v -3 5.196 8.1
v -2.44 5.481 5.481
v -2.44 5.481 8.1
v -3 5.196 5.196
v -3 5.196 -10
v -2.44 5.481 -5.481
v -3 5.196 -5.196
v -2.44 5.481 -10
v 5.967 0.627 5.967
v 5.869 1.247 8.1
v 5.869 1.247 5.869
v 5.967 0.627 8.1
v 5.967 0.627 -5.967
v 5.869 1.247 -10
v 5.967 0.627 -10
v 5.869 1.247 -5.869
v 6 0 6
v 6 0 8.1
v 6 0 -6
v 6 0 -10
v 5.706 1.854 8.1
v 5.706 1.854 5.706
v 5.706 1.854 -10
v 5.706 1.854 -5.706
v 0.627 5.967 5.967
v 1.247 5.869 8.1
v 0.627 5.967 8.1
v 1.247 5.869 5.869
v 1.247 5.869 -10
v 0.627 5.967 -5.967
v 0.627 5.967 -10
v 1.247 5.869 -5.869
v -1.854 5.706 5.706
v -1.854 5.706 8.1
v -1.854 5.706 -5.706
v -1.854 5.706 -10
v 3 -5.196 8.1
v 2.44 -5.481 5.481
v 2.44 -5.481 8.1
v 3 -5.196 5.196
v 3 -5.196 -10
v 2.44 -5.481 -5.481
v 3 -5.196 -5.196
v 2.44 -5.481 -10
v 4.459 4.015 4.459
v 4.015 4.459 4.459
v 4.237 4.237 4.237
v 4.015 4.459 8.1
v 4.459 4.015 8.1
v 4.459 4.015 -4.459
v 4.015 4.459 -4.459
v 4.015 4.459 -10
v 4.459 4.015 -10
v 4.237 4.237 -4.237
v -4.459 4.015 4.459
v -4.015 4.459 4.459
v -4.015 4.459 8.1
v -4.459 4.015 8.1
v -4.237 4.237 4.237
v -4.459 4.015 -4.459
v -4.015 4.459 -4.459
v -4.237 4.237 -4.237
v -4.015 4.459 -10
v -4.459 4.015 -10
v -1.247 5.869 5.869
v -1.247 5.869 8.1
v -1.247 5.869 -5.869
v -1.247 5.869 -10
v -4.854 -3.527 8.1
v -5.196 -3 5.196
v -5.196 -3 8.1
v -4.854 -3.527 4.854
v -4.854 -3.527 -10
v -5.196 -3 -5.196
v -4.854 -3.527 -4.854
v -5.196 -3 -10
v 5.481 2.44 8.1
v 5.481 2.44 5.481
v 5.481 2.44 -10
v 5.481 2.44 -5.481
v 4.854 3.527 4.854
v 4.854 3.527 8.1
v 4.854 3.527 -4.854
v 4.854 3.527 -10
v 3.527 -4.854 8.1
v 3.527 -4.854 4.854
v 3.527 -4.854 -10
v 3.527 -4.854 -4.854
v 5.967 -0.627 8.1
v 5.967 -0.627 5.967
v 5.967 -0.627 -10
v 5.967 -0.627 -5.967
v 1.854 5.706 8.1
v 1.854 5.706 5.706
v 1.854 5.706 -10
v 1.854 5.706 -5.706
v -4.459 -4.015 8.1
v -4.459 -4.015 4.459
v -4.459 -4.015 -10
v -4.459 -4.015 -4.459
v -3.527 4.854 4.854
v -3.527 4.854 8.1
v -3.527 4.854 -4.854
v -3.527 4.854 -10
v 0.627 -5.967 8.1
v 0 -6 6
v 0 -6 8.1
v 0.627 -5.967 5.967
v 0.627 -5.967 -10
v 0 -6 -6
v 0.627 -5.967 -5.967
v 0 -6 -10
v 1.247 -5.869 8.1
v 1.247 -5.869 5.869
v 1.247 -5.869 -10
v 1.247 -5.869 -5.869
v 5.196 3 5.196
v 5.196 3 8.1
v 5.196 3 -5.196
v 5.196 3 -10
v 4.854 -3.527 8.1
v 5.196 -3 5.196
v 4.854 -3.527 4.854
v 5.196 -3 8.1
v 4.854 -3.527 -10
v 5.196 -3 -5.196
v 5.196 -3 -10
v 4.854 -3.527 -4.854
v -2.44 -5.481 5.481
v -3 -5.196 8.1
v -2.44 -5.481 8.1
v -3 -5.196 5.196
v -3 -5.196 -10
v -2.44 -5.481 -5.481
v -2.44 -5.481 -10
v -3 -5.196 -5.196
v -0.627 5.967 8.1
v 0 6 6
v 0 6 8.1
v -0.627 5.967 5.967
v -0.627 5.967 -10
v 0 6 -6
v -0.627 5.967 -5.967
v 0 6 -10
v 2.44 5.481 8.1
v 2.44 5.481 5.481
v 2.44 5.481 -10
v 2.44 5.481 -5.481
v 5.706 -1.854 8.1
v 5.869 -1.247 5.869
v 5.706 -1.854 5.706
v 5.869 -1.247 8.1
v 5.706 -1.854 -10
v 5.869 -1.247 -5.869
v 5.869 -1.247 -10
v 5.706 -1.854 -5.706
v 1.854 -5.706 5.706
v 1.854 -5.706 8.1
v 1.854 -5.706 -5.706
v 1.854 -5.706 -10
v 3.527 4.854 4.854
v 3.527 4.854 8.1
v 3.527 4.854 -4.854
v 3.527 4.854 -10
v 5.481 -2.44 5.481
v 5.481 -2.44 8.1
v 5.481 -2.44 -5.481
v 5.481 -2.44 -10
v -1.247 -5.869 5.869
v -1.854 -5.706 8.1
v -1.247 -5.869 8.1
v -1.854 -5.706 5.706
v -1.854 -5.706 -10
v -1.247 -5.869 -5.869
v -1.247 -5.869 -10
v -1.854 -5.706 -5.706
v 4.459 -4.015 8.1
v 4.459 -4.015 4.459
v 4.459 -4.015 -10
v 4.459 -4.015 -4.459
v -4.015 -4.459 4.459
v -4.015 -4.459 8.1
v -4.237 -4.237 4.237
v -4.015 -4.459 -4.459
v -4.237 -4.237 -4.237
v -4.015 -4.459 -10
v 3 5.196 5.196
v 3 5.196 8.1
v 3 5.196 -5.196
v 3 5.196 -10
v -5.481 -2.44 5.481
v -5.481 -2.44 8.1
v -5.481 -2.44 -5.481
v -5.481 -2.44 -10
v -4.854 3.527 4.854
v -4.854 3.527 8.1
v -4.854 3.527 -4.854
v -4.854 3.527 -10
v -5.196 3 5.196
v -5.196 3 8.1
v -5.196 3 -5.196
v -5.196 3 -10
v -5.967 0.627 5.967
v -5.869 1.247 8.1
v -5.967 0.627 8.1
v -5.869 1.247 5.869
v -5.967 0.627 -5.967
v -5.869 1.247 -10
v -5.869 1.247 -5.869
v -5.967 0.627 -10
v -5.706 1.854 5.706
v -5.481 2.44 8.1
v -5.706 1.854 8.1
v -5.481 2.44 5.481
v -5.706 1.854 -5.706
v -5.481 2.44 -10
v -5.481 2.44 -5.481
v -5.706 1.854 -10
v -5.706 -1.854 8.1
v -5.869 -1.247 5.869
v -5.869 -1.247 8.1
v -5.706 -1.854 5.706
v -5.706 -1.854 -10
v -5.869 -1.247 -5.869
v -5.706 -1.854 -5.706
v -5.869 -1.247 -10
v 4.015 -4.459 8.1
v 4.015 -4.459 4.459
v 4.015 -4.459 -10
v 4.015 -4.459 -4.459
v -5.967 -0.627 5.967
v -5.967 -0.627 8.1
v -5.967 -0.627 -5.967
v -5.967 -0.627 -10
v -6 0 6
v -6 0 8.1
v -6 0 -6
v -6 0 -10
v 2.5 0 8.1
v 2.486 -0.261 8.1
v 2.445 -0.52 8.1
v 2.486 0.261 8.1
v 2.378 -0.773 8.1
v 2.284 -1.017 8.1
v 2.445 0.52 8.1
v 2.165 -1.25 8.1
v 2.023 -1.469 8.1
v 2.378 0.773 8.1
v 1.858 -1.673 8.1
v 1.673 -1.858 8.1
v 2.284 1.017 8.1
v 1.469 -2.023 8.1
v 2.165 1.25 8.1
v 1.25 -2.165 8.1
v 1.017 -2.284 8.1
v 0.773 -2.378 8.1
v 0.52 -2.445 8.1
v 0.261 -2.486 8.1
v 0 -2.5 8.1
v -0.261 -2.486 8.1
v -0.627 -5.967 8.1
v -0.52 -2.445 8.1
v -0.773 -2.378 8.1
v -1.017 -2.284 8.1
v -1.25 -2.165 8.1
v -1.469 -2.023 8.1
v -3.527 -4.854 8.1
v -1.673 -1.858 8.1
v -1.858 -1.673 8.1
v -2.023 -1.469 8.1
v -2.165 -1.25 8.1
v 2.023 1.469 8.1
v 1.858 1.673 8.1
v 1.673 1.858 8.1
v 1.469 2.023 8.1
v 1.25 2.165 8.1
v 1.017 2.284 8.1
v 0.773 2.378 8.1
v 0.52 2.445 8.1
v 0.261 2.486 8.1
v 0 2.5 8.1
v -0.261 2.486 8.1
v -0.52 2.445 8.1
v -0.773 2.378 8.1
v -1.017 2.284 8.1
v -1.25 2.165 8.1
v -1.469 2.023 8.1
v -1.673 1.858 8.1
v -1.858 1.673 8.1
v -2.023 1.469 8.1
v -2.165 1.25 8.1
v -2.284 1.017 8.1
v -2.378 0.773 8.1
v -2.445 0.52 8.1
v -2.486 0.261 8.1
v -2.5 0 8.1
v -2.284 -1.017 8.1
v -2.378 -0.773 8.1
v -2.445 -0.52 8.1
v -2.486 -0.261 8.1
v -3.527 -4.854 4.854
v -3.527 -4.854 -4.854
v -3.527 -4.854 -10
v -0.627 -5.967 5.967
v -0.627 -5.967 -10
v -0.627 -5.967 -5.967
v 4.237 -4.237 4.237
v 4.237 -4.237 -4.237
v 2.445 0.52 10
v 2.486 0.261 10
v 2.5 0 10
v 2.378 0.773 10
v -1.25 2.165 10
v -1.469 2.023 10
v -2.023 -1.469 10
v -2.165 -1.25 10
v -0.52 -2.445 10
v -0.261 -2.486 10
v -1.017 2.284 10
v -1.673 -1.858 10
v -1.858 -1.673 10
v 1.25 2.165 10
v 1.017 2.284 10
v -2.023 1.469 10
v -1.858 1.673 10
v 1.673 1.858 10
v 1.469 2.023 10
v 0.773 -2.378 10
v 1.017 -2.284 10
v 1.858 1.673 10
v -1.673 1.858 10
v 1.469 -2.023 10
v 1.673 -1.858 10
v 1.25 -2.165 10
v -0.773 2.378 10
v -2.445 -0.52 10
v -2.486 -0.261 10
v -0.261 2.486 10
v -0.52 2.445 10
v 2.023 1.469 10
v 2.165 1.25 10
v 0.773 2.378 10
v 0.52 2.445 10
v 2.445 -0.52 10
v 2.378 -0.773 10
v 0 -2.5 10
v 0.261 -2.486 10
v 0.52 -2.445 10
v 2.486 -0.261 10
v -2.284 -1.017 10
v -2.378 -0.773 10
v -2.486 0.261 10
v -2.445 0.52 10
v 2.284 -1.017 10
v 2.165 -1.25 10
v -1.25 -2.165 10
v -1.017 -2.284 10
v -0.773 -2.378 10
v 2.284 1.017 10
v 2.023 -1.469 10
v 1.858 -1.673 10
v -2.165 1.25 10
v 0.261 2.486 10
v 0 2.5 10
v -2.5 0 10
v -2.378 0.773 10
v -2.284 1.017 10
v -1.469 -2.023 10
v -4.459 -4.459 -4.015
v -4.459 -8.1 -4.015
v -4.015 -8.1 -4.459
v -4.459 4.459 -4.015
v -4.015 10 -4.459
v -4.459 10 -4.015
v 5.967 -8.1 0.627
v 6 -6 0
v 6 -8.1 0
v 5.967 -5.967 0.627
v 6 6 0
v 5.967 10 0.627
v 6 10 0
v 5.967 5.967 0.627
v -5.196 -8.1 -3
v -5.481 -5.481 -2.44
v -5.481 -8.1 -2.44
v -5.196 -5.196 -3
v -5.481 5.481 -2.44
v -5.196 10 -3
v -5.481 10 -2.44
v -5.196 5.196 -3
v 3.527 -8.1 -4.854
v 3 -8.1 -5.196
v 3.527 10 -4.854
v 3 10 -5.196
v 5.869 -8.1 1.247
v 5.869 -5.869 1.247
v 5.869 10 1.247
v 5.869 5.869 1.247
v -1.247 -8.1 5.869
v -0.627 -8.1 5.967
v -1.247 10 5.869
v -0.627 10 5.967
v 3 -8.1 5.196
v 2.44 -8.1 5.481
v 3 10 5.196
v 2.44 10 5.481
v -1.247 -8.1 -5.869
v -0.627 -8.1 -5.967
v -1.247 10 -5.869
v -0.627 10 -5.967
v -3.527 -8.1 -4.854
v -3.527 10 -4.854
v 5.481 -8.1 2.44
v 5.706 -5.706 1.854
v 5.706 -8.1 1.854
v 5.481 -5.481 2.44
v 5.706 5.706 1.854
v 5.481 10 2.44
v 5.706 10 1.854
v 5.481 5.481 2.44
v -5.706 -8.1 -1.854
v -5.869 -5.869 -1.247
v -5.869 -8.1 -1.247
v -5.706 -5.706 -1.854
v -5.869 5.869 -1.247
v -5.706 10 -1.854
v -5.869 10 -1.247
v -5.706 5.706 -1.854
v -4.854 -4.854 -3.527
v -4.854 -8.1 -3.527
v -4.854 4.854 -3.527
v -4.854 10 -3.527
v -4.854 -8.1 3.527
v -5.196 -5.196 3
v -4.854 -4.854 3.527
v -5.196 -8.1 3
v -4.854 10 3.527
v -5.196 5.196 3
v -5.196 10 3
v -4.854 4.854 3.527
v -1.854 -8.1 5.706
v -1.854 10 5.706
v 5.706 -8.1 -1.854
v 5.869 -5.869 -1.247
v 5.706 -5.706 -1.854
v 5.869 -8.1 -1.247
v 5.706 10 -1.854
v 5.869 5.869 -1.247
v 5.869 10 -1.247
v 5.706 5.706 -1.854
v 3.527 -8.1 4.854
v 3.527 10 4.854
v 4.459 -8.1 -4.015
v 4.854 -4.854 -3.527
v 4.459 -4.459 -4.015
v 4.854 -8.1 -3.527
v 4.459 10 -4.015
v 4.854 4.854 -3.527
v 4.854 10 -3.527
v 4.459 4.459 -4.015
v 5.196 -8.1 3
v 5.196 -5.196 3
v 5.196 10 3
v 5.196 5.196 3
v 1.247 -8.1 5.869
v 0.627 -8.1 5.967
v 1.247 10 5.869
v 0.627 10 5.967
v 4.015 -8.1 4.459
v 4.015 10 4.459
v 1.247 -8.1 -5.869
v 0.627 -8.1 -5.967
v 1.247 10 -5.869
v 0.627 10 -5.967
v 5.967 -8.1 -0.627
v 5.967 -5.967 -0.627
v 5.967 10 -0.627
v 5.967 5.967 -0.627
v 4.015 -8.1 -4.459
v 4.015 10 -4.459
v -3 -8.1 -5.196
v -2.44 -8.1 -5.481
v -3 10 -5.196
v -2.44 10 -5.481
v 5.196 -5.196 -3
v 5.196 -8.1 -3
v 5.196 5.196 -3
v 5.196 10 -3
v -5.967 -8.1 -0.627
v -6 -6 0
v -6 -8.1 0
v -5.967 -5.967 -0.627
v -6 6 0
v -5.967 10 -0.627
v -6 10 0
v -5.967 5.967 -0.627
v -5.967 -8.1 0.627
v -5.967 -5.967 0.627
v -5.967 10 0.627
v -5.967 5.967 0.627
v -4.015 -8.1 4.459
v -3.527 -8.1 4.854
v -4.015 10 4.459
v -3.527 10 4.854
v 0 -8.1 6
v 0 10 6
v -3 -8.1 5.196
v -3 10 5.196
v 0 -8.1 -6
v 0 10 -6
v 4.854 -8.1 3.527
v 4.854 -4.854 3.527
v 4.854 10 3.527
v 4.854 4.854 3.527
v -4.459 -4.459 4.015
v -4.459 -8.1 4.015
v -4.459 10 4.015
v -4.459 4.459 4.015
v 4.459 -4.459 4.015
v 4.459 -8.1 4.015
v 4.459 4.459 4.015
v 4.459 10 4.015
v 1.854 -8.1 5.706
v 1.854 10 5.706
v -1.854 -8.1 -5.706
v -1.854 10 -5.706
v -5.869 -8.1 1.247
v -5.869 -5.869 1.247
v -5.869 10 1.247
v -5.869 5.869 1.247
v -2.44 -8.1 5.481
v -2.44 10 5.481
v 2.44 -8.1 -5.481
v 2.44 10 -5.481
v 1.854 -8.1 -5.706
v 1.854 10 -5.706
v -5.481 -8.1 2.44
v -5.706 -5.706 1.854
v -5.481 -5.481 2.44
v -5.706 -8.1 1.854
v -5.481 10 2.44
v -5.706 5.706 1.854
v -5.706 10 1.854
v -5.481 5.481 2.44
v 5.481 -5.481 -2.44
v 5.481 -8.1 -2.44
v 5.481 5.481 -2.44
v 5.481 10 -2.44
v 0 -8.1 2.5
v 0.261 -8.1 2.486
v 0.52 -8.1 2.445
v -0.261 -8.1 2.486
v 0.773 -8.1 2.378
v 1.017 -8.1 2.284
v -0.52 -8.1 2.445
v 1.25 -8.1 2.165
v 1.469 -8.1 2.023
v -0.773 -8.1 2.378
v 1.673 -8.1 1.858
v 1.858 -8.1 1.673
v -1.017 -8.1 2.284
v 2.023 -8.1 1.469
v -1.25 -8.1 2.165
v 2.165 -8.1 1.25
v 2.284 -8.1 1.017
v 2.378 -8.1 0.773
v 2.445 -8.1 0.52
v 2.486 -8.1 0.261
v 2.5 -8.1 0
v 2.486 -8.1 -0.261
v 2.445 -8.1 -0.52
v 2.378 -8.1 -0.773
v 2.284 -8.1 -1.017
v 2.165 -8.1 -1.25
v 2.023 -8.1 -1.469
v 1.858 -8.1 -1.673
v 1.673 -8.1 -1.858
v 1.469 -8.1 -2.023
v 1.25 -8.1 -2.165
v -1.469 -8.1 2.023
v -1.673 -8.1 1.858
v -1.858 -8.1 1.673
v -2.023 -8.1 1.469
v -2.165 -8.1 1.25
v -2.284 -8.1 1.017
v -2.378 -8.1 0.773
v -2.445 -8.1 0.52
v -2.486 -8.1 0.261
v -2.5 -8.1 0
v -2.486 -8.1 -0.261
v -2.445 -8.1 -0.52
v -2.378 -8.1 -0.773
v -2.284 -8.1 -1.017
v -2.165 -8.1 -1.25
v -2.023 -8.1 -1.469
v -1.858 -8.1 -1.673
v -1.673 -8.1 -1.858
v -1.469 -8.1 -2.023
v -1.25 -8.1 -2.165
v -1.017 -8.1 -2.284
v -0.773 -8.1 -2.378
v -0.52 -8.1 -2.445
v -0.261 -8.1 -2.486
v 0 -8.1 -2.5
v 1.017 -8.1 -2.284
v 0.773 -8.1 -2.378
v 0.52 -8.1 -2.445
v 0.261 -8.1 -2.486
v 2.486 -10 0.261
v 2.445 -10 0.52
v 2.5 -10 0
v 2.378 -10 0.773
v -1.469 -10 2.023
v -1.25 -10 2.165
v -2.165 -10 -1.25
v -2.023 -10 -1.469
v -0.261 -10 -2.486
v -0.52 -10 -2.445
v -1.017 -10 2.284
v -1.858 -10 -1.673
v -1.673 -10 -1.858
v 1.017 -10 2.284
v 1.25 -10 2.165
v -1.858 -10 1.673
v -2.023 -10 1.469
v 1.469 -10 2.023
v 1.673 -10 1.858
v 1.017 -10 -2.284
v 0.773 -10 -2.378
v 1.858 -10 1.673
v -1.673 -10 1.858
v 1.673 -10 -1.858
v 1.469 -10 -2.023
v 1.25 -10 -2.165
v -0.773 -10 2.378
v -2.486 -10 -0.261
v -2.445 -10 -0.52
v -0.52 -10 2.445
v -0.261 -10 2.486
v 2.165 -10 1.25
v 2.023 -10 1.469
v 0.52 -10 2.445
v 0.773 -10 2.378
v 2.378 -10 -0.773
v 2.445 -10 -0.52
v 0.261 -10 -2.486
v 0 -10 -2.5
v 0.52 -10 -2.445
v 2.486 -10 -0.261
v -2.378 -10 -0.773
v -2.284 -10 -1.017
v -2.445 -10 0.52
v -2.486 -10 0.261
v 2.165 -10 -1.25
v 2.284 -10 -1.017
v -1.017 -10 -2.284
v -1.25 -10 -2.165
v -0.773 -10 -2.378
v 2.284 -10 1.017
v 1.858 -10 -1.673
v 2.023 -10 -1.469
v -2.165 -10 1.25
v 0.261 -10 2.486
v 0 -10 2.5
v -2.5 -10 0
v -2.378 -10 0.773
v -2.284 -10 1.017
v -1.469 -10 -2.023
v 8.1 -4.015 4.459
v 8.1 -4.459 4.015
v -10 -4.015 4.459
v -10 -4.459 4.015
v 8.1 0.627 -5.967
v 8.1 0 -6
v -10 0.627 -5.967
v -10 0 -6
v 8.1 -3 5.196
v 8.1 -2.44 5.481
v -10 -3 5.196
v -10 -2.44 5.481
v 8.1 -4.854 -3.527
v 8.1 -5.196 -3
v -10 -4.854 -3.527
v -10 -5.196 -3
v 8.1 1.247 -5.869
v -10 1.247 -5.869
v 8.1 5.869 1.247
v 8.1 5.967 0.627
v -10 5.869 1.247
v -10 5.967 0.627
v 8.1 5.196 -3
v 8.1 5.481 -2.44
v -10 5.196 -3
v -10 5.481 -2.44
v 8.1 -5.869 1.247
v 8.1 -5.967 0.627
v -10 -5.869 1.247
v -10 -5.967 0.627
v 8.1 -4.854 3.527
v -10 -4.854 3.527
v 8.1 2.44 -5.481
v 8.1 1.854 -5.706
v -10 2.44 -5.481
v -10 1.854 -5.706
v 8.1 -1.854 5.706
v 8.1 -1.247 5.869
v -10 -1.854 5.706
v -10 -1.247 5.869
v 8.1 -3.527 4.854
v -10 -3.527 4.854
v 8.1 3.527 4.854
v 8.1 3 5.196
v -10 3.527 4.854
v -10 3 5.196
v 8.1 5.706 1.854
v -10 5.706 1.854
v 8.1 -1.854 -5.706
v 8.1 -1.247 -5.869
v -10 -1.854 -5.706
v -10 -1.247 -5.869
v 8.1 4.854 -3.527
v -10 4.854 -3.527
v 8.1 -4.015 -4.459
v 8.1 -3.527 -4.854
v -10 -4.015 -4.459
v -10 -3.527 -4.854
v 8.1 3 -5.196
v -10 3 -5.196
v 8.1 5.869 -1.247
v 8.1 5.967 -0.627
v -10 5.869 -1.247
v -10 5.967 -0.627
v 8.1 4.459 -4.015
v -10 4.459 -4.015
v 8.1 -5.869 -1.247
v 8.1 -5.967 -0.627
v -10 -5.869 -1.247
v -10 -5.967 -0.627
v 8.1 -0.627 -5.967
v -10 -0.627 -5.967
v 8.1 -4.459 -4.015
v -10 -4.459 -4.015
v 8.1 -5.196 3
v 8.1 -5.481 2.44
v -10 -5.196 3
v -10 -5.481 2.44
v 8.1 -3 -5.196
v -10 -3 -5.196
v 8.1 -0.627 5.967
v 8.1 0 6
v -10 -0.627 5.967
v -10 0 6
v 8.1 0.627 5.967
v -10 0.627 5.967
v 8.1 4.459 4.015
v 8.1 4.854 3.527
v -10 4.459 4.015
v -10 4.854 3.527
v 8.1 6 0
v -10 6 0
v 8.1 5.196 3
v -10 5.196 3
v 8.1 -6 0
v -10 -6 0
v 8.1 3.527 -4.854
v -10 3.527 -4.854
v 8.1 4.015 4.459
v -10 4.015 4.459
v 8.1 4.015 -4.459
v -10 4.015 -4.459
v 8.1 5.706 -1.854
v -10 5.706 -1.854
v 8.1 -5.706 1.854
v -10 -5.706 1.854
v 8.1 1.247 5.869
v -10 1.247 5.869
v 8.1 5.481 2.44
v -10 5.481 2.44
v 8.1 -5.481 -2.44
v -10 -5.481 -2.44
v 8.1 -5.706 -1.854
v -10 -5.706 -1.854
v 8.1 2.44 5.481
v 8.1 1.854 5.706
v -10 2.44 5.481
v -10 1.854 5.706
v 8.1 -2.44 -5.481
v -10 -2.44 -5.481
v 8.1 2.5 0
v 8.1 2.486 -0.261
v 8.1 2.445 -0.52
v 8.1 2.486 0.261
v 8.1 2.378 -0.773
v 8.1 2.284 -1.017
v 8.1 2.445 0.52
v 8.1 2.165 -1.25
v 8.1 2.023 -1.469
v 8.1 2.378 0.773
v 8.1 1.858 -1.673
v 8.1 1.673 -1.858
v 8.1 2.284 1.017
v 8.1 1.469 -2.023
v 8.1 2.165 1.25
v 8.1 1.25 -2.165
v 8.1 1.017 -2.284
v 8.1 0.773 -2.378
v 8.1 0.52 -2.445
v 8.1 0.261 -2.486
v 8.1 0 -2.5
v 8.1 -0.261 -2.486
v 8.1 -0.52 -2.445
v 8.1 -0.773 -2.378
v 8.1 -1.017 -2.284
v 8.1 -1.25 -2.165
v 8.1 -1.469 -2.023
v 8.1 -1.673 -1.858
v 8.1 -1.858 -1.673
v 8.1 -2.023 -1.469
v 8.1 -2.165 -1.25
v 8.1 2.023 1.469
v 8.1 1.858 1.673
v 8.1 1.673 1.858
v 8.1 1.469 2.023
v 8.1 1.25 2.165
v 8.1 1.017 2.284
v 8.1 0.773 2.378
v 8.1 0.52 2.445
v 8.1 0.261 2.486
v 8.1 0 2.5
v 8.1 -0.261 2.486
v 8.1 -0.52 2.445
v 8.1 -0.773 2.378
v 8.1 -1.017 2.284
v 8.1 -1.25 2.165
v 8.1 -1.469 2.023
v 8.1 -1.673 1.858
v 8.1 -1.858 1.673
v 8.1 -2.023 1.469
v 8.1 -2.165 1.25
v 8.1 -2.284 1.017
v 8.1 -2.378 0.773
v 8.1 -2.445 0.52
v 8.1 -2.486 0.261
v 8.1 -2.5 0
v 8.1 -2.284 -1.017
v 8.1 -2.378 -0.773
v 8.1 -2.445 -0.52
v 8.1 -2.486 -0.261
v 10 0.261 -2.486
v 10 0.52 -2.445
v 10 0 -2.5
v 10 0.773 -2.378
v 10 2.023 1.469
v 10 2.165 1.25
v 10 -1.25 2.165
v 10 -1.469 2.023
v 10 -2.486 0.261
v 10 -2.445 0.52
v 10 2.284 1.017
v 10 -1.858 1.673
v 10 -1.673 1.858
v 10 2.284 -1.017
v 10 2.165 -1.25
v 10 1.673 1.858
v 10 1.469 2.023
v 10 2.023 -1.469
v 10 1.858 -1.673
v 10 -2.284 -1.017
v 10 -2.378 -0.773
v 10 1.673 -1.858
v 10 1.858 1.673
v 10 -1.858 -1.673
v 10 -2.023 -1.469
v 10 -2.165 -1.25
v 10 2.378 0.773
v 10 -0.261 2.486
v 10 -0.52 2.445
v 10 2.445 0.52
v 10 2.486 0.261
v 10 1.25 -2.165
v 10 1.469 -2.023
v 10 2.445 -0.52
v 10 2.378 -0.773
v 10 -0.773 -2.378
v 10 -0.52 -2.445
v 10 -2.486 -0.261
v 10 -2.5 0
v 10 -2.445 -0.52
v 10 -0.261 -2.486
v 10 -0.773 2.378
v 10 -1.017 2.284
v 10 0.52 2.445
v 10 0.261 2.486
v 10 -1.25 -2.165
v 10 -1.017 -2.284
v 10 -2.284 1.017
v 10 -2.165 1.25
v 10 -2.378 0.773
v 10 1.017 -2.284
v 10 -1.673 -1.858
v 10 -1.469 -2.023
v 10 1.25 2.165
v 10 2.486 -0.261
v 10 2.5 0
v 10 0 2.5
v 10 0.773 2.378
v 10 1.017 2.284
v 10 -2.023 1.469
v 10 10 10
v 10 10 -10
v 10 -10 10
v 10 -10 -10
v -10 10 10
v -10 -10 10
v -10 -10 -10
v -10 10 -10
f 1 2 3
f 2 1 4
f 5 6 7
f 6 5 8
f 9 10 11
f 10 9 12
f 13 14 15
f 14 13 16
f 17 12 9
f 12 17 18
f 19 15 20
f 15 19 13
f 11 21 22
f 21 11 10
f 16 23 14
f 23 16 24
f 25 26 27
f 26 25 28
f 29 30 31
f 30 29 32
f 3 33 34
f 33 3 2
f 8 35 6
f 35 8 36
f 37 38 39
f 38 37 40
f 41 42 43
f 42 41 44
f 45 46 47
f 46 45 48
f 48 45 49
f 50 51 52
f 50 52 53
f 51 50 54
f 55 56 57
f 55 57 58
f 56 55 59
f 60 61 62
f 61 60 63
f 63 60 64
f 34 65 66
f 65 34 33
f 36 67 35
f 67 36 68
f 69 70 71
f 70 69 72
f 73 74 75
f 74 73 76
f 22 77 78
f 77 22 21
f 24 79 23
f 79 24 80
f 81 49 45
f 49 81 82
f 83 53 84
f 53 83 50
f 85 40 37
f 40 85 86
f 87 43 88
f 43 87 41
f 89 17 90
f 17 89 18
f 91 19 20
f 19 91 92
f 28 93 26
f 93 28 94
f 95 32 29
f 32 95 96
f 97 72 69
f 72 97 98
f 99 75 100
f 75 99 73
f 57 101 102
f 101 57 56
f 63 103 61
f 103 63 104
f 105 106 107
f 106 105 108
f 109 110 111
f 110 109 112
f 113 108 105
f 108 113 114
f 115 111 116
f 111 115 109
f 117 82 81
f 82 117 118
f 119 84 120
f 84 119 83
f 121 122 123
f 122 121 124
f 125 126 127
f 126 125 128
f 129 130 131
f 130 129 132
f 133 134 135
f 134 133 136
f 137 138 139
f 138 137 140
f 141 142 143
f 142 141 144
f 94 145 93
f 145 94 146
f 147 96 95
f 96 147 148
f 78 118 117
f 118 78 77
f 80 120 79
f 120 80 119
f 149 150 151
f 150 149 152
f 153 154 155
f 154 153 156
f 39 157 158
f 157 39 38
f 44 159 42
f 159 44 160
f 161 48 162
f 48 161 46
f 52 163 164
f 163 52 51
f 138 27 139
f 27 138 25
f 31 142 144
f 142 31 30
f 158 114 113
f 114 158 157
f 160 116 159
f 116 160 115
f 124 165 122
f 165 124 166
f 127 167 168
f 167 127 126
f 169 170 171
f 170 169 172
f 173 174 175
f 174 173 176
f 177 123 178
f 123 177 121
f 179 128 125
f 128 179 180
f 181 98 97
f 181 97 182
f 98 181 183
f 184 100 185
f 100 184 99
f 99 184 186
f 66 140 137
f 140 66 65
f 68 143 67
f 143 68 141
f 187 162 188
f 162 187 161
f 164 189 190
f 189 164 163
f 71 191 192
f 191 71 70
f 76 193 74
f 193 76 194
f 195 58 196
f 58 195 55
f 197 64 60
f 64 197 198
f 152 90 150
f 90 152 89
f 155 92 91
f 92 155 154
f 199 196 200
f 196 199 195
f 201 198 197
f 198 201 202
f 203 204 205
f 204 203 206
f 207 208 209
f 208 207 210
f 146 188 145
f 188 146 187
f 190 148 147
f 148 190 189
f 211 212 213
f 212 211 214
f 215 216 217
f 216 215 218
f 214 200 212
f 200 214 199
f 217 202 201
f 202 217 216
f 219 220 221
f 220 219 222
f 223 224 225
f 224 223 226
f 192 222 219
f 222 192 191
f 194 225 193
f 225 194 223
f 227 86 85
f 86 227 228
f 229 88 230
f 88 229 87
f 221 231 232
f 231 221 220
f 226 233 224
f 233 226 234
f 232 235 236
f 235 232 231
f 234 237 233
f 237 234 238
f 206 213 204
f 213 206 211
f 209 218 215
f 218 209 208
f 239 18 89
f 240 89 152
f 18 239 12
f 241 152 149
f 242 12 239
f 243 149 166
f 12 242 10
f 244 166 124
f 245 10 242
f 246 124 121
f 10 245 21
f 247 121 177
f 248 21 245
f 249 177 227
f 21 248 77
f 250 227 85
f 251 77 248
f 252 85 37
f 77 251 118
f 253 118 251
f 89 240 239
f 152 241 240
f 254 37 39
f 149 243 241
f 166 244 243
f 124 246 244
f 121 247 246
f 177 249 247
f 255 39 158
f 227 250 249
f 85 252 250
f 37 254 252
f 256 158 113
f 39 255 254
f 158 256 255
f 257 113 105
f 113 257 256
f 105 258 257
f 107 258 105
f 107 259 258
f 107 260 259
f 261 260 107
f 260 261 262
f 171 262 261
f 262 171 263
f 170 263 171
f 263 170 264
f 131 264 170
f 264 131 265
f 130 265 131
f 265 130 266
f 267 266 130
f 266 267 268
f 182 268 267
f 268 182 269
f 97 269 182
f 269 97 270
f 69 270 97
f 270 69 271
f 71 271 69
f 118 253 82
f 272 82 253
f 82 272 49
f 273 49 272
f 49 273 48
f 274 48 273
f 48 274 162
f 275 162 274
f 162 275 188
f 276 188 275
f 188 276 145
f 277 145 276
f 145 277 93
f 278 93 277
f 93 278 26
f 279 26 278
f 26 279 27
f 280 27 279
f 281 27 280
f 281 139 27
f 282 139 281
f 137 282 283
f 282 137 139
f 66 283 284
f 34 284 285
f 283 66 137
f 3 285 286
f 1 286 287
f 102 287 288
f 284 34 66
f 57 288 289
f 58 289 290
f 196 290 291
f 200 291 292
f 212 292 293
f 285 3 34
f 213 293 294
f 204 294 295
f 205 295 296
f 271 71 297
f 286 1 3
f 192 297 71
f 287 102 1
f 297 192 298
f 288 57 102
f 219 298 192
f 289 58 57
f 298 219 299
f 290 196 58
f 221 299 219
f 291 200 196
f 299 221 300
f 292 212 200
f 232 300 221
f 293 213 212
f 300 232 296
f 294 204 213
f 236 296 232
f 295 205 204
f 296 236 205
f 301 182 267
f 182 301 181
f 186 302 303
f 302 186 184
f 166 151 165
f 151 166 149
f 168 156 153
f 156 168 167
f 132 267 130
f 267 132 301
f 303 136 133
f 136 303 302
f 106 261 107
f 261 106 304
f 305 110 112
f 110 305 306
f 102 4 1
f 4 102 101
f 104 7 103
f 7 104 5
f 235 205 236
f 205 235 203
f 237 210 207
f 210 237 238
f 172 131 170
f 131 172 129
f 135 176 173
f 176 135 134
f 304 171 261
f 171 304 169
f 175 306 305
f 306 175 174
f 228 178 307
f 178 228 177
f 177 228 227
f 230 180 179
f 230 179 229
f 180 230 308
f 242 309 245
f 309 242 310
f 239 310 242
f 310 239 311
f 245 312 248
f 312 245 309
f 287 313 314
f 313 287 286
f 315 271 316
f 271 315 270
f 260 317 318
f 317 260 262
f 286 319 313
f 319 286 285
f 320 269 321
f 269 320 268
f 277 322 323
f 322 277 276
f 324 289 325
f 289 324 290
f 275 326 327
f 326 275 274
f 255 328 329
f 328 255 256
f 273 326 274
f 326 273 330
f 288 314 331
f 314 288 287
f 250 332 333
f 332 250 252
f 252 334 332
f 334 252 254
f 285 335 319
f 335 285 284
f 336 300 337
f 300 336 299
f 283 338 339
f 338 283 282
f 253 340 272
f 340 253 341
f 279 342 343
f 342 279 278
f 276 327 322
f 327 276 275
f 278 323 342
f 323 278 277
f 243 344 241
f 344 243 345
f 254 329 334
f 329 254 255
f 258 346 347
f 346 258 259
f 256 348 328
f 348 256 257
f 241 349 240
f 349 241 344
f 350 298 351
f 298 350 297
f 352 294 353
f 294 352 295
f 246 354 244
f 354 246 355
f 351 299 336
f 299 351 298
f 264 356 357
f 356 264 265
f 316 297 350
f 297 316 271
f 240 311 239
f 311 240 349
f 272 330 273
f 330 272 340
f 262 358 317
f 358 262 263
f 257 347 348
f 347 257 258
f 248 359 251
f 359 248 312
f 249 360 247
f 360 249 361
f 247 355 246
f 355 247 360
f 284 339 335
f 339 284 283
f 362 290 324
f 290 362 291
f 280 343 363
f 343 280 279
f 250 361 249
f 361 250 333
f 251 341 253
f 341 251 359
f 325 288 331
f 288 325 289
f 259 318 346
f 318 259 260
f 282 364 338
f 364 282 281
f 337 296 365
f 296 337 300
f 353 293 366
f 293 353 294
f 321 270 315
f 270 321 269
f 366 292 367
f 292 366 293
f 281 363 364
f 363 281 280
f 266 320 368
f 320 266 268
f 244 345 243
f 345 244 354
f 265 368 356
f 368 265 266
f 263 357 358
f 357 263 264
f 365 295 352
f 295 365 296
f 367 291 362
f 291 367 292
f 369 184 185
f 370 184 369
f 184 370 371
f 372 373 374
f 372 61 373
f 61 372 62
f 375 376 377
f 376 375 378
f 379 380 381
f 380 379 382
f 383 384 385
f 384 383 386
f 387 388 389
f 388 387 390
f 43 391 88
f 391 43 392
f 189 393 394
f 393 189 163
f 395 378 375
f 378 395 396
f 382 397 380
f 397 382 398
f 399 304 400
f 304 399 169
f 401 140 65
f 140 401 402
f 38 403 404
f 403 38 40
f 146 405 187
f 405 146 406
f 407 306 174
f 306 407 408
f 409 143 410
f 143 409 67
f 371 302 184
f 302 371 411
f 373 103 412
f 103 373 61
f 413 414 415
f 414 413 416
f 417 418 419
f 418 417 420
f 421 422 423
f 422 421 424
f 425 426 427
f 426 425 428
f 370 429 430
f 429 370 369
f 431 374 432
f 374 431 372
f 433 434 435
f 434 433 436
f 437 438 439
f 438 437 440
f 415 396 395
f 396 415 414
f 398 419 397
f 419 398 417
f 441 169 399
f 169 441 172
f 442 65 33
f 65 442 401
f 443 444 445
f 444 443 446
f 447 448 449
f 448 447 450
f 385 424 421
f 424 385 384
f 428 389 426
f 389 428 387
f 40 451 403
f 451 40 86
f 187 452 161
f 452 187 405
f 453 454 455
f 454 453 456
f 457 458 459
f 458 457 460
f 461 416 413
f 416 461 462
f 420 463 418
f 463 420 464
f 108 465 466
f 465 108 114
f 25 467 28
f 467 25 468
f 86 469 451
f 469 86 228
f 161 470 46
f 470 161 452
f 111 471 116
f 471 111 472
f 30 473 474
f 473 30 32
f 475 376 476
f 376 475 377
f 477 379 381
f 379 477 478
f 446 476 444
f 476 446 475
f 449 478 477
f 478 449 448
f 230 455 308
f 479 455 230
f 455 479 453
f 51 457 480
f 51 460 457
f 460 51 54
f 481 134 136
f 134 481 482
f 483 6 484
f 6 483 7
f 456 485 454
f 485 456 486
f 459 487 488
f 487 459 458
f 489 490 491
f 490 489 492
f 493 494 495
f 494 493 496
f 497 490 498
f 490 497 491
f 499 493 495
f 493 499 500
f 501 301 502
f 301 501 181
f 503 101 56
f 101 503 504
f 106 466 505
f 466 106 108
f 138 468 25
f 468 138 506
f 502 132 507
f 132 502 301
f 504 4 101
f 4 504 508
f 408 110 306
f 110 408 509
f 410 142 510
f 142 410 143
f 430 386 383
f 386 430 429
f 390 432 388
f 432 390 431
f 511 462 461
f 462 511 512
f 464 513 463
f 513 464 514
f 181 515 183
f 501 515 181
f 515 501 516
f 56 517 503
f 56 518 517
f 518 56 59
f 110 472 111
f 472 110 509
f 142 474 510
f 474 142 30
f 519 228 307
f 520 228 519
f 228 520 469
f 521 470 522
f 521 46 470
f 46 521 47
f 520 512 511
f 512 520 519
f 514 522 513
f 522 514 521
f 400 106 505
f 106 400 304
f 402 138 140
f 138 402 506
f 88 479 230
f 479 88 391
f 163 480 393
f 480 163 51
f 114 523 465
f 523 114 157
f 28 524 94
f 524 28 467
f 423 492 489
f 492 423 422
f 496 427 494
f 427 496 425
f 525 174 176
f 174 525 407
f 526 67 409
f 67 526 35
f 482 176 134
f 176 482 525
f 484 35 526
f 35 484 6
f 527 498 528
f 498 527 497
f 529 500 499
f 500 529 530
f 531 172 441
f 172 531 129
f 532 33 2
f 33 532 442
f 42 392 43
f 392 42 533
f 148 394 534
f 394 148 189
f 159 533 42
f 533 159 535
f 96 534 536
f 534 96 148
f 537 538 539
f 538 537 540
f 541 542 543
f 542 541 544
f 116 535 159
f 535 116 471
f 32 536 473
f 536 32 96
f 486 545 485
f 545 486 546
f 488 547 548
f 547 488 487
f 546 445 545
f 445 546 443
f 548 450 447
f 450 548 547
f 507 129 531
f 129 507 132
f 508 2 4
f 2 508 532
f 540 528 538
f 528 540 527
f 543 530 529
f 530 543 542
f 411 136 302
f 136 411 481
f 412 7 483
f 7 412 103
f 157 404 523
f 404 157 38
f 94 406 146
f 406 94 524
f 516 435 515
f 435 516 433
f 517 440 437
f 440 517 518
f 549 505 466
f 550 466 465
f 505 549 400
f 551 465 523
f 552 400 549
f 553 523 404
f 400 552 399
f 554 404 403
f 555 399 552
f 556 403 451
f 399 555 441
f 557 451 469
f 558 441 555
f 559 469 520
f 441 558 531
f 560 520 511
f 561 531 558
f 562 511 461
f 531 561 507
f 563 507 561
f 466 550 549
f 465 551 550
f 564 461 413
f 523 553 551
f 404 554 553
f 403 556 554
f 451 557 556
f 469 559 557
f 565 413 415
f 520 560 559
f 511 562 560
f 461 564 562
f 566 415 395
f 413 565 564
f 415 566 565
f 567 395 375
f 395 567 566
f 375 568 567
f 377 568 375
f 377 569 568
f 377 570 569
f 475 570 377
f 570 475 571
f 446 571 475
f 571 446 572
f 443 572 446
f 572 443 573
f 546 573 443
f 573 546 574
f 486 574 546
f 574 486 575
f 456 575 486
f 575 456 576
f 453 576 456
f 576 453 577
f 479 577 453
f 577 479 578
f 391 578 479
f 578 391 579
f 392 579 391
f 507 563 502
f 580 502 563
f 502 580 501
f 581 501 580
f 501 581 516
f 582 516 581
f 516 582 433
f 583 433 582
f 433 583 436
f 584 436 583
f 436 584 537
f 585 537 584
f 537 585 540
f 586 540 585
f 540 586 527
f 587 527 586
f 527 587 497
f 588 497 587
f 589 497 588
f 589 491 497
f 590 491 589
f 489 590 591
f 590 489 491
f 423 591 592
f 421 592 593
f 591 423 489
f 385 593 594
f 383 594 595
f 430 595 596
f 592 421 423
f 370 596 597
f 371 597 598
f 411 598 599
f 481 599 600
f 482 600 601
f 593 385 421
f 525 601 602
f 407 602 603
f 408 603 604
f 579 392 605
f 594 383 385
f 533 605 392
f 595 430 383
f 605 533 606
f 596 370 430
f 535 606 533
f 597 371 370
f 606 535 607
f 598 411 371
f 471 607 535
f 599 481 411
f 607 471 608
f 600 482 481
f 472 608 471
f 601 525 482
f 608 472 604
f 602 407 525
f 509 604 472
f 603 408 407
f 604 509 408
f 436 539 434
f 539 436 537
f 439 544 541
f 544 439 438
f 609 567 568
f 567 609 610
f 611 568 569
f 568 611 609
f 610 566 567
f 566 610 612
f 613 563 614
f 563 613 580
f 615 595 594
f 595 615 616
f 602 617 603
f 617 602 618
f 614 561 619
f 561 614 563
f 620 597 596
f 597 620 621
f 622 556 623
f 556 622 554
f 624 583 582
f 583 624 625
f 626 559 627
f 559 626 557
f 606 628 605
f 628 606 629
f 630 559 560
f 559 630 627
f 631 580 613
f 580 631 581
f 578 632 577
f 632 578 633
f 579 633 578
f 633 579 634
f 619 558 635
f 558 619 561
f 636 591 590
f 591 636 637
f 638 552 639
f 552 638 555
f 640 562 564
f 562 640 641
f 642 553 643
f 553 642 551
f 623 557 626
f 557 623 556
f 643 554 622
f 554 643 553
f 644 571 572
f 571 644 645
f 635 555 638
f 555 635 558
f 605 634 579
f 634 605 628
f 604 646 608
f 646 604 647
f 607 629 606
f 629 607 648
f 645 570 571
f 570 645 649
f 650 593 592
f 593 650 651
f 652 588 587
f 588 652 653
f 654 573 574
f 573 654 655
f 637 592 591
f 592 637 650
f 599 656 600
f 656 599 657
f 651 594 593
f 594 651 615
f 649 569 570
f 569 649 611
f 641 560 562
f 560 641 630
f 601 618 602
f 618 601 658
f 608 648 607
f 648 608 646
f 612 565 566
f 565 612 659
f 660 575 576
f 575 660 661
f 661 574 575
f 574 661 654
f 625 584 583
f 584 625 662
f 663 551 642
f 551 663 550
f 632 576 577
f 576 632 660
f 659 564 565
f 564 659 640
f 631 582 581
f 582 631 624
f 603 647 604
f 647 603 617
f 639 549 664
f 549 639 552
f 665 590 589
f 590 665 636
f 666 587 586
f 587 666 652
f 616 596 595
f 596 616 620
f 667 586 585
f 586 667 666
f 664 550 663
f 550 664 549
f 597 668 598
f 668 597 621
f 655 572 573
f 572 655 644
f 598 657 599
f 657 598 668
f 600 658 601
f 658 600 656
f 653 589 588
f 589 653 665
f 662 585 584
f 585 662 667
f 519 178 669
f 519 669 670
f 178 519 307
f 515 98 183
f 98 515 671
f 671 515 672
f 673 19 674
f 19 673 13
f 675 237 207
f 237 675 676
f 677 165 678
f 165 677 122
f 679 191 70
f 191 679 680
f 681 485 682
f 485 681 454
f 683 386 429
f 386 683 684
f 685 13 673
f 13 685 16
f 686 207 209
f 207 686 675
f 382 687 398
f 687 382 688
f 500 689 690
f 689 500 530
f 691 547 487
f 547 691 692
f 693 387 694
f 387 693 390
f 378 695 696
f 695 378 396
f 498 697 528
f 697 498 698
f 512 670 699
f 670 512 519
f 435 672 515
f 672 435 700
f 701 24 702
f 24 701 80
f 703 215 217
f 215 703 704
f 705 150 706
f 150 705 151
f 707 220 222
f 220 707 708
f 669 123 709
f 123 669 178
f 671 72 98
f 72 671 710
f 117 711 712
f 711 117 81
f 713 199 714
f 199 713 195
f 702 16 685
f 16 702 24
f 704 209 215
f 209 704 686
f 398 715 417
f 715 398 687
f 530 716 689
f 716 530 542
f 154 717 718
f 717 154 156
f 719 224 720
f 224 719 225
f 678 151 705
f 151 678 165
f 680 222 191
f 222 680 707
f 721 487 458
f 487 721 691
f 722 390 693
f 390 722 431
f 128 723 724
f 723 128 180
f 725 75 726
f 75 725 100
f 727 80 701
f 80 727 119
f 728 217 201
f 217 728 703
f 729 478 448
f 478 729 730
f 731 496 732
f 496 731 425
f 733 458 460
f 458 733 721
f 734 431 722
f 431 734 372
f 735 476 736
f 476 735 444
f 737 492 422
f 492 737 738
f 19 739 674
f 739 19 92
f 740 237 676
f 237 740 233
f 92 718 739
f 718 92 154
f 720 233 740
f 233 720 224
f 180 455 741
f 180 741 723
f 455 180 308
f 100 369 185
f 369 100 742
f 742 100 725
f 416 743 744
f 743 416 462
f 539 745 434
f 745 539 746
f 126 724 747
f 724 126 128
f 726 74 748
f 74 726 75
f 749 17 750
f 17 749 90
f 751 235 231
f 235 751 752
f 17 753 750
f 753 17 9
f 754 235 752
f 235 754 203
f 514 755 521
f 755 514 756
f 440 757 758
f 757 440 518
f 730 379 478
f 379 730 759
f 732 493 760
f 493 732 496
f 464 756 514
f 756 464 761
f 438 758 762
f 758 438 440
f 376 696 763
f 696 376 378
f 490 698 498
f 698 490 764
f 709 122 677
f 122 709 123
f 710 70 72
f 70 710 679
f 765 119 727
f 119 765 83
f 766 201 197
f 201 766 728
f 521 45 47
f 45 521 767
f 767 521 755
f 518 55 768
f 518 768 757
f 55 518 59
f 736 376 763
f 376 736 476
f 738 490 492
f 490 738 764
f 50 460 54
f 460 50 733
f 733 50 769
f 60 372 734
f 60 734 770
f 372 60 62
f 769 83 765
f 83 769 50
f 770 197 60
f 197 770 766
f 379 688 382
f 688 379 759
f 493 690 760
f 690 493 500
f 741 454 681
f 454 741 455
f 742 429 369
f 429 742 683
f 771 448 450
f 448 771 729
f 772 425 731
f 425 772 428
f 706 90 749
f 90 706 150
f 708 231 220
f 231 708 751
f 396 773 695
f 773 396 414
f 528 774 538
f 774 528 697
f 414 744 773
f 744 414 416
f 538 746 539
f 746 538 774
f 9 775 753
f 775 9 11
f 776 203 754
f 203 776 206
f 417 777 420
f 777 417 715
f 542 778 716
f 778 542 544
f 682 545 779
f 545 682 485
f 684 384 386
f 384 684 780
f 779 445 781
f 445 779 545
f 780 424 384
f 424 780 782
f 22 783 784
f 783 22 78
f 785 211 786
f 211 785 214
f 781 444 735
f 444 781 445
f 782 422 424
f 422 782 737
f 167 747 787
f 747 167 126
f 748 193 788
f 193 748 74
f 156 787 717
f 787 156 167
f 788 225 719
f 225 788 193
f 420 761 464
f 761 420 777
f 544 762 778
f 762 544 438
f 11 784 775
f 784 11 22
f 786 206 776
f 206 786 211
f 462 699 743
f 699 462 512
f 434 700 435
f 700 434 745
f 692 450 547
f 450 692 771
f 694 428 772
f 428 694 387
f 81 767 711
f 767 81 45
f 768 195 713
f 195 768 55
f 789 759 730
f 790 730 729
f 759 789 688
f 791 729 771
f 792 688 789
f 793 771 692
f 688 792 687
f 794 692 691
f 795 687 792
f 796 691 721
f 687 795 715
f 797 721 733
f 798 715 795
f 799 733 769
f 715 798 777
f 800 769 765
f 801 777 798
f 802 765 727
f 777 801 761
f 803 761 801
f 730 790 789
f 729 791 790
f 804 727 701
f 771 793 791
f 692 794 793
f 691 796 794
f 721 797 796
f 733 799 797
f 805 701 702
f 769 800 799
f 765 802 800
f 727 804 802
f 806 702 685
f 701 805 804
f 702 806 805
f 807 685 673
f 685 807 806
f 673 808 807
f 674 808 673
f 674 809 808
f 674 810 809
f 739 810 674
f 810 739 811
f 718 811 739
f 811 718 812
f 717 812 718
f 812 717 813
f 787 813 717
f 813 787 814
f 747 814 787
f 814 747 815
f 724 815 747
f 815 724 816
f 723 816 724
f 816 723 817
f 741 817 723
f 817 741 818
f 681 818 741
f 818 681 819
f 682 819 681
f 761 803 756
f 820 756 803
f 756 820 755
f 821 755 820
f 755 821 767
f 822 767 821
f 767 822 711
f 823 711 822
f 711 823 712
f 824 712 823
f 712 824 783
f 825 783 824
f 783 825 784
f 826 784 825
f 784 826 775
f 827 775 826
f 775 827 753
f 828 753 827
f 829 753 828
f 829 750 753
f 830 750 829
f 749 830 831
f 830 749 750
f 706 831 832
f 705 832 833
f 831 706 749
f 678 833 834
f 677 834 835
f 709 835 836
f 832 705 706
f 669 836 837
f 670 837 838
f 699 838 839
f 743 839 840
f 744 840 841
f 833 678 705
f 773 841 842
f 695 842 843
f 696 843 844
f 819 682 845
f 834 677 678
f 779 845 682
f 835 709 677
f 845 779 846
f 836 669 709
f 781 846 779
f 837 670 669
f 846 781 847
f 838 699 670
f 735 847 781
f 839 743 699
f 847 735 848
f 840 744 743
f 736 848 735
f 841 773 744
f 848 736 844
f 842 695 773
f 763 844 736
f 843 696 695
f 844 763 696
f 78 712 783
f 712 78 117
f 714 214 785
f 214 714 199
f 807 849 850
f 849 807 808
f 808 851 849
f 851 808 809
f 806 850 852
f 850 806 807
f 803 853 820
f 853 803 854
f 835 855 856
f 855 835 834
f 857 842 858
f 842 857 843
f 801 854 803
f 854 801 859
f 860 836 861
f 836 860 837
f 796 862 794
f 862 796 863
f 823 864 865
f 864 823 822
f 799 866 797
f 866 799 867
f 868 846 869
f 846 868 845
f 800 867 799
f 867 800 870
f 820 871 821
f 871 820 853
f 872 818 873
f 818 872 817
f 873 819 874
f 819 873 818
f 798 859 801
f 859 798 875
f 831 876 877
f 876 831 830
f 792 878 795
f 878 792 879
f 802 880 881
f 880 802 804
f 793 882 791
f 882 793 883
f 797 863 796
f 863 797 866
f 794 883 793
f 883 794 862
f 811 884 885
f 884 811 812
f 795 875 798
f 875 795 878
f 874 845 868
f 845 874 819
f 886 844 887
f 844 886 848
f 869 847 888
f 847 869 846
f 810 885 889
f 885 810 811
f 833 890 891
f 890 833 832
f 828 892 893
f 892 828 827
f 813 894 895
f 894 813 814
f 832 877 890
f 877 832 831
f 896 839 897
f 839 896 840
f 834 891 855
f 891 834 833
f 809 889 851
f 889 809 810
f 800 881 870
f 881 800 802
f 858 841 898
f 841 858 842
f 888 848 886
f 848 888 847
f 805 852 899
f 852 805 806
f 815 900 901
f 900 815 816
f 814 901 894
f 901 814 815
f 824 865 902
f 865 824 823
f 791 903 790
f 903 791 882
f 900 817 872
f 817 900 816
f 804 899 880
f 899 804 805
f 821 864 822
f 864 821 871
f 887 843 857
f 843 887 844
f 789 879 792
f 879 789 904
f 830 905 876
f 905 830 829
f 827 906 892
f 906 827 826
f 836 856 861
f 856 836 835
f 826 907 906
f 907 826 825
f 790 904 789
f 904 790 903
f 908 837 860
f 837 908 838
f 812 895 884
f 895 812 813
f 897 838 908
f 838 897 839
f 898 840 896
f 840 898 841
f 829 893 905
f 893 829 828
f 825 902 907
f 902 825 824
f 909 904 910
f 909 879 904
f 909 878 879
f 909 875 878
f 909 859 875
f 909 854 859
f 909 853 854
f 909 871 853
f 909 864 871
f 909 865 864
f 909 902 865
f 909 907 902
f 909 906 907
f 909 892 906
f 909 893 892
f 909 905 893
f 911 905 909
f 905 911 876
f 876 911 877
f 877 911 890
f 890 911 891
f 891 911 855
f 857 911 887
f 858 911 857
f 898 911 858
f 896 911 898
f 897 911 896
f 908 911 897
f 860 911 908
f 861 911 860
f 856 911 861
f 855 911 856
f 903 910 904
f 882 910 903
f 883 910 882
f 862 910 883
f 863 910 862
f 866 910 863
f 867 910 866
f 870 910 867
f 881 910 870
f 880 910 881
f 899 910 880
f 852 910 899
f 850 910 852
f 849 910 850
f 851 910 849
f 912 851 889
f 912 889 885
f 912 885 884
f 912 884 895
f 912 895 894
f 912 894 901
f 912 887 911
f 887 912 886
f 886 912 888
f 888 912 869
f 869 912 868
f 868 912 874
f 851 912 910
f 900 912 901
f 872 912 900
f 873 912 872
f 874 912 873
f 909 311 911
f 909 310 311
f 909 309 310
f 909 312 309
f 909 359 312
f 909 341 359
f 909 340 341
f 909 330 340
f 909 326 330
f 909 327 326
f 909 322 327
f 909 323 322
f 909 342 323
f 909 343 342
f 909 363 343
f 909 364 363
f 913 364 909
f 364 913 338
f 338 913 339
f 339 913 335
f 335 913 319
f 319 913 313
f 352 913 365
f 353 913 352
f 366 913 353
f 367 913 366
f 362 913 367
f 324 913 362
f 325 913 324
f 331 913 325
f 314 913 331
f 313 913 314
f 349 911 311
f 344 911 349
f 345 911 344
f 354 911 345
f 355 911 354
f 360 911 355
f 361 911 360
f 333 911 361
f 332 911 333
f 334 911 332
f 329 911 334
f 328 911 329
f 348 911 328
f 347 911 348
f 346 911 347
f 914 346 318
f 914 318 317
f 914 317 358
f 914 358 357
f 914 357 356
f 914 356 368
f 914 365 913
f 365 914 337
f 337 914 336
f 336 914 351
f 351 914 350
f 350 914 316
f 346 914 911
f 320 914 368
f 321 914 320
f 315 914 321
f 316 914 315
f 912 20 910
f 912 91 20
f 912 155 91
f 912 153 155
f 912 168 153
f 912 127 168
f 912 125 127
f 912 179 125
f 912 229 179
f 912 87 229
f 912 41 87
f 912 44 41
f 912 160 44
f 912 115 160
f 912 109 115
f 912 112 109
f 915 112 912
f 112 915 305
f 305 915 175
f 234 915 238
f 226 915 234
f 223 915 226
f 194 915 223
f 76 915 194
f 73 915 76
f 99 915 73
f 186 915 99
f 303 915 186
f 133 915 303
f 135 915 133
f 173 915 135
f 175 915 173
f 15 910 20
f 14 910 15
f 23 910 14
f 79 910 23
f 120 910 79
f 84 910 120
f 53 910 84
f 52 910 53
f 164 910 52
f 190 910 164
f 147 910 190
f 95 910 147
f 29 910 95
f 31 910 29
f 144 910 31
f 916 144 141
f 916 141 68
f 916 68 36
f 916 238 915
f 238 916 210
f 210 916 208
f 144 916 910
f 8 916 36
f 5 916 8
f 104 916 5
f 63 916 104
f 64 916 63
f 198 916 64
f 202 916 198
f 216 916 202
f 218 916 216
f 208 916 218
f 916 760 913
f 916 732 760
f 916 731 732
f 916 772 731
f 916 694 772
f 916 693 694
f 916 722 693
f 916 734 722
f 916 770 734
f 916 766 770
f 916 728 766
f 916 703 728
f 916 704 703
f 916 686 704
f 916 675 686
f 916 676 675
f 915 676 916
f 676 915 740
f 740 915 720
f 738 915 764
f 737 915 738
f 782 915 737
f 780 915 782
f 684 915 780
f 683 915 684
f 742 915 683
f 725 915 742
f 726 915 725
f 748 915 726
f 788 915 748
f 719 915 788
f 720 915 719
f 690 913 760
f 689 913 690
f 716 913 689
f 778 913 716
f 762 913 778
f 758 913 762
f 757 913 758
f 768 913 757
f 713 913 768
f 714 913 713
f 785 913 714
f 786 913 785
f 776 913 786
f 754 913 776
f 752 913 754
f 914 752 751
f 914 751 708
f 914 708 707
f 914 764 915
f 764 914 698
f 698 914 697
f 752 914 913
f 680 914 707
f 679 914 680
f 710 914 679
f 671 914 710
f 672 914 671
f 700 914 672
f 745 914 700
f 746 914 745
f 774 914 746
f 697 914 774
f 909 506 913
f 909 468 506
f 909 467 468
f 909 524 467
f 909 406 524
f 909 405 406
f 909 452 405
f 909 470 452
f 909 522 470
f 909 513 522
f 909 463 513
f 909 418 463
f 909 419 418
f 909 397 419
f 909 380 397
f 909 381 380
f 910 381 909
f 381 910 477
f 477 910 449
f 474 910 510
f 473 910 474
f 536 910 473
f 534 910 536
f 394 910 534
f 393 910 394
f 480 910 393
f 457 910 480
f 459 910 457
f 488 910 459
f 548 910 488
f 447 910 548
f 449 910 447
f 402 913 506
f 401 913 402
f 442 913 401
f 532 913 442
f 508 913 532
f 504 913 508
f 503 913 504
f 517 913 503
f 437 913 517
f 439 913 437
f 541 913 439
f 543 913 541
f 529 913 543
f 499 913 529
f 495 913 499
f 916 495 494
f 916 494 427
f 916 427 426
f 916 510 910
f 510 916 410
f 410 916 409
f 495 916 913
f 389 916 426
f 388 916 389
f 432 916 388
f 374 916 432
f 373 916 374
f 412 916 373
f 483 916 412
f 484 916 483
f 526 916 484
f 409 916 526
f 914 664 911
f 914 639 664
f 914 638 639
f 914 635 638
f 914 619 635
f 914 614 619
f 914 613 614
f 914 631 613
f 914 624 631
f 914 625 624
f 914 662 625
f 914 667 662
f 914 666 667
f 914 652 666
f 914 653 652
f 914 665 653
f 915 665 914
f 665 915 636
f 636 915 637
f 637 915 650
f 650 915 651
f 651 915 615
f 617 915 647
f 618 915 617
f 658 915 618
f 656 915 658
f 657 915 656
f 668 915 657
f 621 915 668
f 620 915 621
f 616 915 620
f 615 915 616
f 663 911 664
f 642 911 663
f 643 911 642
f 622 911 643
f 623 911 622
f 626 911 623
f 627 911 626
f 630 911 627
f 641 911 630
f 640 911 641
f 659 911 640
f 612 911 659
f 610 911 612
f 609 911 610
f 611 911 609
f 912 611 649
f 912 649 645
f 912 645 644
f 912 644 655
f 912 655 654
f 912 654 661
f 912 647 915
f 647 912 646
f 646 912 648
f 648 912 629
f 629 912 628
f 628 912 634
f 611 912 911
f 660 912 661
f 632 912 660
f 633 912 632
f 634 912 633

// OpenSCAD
module counterbore(size) {
    translate([0.,0.,-size/2.-0.1])
                cylinder(h=size-2.+0.2,r=6.,$fn=60);
}
module screwhole(size) {
    translate([0.,0.,-size/2.-0.1])
                cylinder(h=size+0.2,r=2.5,$fn=60);
}

module pass(size) {
    counterbore(size);
    screwhole(size);
}

module cornercube(size) {
    difference() {
        translate([-size/2., -size/2., -size/2.])
            cube([size, size, size]);
        
        union() {
            pass(size);
            rotate([90.,0.,0.]) pass(size);
            rotate([0.,90.,0.]) pass(size);
        }
    }
}

cornercube(20.);
